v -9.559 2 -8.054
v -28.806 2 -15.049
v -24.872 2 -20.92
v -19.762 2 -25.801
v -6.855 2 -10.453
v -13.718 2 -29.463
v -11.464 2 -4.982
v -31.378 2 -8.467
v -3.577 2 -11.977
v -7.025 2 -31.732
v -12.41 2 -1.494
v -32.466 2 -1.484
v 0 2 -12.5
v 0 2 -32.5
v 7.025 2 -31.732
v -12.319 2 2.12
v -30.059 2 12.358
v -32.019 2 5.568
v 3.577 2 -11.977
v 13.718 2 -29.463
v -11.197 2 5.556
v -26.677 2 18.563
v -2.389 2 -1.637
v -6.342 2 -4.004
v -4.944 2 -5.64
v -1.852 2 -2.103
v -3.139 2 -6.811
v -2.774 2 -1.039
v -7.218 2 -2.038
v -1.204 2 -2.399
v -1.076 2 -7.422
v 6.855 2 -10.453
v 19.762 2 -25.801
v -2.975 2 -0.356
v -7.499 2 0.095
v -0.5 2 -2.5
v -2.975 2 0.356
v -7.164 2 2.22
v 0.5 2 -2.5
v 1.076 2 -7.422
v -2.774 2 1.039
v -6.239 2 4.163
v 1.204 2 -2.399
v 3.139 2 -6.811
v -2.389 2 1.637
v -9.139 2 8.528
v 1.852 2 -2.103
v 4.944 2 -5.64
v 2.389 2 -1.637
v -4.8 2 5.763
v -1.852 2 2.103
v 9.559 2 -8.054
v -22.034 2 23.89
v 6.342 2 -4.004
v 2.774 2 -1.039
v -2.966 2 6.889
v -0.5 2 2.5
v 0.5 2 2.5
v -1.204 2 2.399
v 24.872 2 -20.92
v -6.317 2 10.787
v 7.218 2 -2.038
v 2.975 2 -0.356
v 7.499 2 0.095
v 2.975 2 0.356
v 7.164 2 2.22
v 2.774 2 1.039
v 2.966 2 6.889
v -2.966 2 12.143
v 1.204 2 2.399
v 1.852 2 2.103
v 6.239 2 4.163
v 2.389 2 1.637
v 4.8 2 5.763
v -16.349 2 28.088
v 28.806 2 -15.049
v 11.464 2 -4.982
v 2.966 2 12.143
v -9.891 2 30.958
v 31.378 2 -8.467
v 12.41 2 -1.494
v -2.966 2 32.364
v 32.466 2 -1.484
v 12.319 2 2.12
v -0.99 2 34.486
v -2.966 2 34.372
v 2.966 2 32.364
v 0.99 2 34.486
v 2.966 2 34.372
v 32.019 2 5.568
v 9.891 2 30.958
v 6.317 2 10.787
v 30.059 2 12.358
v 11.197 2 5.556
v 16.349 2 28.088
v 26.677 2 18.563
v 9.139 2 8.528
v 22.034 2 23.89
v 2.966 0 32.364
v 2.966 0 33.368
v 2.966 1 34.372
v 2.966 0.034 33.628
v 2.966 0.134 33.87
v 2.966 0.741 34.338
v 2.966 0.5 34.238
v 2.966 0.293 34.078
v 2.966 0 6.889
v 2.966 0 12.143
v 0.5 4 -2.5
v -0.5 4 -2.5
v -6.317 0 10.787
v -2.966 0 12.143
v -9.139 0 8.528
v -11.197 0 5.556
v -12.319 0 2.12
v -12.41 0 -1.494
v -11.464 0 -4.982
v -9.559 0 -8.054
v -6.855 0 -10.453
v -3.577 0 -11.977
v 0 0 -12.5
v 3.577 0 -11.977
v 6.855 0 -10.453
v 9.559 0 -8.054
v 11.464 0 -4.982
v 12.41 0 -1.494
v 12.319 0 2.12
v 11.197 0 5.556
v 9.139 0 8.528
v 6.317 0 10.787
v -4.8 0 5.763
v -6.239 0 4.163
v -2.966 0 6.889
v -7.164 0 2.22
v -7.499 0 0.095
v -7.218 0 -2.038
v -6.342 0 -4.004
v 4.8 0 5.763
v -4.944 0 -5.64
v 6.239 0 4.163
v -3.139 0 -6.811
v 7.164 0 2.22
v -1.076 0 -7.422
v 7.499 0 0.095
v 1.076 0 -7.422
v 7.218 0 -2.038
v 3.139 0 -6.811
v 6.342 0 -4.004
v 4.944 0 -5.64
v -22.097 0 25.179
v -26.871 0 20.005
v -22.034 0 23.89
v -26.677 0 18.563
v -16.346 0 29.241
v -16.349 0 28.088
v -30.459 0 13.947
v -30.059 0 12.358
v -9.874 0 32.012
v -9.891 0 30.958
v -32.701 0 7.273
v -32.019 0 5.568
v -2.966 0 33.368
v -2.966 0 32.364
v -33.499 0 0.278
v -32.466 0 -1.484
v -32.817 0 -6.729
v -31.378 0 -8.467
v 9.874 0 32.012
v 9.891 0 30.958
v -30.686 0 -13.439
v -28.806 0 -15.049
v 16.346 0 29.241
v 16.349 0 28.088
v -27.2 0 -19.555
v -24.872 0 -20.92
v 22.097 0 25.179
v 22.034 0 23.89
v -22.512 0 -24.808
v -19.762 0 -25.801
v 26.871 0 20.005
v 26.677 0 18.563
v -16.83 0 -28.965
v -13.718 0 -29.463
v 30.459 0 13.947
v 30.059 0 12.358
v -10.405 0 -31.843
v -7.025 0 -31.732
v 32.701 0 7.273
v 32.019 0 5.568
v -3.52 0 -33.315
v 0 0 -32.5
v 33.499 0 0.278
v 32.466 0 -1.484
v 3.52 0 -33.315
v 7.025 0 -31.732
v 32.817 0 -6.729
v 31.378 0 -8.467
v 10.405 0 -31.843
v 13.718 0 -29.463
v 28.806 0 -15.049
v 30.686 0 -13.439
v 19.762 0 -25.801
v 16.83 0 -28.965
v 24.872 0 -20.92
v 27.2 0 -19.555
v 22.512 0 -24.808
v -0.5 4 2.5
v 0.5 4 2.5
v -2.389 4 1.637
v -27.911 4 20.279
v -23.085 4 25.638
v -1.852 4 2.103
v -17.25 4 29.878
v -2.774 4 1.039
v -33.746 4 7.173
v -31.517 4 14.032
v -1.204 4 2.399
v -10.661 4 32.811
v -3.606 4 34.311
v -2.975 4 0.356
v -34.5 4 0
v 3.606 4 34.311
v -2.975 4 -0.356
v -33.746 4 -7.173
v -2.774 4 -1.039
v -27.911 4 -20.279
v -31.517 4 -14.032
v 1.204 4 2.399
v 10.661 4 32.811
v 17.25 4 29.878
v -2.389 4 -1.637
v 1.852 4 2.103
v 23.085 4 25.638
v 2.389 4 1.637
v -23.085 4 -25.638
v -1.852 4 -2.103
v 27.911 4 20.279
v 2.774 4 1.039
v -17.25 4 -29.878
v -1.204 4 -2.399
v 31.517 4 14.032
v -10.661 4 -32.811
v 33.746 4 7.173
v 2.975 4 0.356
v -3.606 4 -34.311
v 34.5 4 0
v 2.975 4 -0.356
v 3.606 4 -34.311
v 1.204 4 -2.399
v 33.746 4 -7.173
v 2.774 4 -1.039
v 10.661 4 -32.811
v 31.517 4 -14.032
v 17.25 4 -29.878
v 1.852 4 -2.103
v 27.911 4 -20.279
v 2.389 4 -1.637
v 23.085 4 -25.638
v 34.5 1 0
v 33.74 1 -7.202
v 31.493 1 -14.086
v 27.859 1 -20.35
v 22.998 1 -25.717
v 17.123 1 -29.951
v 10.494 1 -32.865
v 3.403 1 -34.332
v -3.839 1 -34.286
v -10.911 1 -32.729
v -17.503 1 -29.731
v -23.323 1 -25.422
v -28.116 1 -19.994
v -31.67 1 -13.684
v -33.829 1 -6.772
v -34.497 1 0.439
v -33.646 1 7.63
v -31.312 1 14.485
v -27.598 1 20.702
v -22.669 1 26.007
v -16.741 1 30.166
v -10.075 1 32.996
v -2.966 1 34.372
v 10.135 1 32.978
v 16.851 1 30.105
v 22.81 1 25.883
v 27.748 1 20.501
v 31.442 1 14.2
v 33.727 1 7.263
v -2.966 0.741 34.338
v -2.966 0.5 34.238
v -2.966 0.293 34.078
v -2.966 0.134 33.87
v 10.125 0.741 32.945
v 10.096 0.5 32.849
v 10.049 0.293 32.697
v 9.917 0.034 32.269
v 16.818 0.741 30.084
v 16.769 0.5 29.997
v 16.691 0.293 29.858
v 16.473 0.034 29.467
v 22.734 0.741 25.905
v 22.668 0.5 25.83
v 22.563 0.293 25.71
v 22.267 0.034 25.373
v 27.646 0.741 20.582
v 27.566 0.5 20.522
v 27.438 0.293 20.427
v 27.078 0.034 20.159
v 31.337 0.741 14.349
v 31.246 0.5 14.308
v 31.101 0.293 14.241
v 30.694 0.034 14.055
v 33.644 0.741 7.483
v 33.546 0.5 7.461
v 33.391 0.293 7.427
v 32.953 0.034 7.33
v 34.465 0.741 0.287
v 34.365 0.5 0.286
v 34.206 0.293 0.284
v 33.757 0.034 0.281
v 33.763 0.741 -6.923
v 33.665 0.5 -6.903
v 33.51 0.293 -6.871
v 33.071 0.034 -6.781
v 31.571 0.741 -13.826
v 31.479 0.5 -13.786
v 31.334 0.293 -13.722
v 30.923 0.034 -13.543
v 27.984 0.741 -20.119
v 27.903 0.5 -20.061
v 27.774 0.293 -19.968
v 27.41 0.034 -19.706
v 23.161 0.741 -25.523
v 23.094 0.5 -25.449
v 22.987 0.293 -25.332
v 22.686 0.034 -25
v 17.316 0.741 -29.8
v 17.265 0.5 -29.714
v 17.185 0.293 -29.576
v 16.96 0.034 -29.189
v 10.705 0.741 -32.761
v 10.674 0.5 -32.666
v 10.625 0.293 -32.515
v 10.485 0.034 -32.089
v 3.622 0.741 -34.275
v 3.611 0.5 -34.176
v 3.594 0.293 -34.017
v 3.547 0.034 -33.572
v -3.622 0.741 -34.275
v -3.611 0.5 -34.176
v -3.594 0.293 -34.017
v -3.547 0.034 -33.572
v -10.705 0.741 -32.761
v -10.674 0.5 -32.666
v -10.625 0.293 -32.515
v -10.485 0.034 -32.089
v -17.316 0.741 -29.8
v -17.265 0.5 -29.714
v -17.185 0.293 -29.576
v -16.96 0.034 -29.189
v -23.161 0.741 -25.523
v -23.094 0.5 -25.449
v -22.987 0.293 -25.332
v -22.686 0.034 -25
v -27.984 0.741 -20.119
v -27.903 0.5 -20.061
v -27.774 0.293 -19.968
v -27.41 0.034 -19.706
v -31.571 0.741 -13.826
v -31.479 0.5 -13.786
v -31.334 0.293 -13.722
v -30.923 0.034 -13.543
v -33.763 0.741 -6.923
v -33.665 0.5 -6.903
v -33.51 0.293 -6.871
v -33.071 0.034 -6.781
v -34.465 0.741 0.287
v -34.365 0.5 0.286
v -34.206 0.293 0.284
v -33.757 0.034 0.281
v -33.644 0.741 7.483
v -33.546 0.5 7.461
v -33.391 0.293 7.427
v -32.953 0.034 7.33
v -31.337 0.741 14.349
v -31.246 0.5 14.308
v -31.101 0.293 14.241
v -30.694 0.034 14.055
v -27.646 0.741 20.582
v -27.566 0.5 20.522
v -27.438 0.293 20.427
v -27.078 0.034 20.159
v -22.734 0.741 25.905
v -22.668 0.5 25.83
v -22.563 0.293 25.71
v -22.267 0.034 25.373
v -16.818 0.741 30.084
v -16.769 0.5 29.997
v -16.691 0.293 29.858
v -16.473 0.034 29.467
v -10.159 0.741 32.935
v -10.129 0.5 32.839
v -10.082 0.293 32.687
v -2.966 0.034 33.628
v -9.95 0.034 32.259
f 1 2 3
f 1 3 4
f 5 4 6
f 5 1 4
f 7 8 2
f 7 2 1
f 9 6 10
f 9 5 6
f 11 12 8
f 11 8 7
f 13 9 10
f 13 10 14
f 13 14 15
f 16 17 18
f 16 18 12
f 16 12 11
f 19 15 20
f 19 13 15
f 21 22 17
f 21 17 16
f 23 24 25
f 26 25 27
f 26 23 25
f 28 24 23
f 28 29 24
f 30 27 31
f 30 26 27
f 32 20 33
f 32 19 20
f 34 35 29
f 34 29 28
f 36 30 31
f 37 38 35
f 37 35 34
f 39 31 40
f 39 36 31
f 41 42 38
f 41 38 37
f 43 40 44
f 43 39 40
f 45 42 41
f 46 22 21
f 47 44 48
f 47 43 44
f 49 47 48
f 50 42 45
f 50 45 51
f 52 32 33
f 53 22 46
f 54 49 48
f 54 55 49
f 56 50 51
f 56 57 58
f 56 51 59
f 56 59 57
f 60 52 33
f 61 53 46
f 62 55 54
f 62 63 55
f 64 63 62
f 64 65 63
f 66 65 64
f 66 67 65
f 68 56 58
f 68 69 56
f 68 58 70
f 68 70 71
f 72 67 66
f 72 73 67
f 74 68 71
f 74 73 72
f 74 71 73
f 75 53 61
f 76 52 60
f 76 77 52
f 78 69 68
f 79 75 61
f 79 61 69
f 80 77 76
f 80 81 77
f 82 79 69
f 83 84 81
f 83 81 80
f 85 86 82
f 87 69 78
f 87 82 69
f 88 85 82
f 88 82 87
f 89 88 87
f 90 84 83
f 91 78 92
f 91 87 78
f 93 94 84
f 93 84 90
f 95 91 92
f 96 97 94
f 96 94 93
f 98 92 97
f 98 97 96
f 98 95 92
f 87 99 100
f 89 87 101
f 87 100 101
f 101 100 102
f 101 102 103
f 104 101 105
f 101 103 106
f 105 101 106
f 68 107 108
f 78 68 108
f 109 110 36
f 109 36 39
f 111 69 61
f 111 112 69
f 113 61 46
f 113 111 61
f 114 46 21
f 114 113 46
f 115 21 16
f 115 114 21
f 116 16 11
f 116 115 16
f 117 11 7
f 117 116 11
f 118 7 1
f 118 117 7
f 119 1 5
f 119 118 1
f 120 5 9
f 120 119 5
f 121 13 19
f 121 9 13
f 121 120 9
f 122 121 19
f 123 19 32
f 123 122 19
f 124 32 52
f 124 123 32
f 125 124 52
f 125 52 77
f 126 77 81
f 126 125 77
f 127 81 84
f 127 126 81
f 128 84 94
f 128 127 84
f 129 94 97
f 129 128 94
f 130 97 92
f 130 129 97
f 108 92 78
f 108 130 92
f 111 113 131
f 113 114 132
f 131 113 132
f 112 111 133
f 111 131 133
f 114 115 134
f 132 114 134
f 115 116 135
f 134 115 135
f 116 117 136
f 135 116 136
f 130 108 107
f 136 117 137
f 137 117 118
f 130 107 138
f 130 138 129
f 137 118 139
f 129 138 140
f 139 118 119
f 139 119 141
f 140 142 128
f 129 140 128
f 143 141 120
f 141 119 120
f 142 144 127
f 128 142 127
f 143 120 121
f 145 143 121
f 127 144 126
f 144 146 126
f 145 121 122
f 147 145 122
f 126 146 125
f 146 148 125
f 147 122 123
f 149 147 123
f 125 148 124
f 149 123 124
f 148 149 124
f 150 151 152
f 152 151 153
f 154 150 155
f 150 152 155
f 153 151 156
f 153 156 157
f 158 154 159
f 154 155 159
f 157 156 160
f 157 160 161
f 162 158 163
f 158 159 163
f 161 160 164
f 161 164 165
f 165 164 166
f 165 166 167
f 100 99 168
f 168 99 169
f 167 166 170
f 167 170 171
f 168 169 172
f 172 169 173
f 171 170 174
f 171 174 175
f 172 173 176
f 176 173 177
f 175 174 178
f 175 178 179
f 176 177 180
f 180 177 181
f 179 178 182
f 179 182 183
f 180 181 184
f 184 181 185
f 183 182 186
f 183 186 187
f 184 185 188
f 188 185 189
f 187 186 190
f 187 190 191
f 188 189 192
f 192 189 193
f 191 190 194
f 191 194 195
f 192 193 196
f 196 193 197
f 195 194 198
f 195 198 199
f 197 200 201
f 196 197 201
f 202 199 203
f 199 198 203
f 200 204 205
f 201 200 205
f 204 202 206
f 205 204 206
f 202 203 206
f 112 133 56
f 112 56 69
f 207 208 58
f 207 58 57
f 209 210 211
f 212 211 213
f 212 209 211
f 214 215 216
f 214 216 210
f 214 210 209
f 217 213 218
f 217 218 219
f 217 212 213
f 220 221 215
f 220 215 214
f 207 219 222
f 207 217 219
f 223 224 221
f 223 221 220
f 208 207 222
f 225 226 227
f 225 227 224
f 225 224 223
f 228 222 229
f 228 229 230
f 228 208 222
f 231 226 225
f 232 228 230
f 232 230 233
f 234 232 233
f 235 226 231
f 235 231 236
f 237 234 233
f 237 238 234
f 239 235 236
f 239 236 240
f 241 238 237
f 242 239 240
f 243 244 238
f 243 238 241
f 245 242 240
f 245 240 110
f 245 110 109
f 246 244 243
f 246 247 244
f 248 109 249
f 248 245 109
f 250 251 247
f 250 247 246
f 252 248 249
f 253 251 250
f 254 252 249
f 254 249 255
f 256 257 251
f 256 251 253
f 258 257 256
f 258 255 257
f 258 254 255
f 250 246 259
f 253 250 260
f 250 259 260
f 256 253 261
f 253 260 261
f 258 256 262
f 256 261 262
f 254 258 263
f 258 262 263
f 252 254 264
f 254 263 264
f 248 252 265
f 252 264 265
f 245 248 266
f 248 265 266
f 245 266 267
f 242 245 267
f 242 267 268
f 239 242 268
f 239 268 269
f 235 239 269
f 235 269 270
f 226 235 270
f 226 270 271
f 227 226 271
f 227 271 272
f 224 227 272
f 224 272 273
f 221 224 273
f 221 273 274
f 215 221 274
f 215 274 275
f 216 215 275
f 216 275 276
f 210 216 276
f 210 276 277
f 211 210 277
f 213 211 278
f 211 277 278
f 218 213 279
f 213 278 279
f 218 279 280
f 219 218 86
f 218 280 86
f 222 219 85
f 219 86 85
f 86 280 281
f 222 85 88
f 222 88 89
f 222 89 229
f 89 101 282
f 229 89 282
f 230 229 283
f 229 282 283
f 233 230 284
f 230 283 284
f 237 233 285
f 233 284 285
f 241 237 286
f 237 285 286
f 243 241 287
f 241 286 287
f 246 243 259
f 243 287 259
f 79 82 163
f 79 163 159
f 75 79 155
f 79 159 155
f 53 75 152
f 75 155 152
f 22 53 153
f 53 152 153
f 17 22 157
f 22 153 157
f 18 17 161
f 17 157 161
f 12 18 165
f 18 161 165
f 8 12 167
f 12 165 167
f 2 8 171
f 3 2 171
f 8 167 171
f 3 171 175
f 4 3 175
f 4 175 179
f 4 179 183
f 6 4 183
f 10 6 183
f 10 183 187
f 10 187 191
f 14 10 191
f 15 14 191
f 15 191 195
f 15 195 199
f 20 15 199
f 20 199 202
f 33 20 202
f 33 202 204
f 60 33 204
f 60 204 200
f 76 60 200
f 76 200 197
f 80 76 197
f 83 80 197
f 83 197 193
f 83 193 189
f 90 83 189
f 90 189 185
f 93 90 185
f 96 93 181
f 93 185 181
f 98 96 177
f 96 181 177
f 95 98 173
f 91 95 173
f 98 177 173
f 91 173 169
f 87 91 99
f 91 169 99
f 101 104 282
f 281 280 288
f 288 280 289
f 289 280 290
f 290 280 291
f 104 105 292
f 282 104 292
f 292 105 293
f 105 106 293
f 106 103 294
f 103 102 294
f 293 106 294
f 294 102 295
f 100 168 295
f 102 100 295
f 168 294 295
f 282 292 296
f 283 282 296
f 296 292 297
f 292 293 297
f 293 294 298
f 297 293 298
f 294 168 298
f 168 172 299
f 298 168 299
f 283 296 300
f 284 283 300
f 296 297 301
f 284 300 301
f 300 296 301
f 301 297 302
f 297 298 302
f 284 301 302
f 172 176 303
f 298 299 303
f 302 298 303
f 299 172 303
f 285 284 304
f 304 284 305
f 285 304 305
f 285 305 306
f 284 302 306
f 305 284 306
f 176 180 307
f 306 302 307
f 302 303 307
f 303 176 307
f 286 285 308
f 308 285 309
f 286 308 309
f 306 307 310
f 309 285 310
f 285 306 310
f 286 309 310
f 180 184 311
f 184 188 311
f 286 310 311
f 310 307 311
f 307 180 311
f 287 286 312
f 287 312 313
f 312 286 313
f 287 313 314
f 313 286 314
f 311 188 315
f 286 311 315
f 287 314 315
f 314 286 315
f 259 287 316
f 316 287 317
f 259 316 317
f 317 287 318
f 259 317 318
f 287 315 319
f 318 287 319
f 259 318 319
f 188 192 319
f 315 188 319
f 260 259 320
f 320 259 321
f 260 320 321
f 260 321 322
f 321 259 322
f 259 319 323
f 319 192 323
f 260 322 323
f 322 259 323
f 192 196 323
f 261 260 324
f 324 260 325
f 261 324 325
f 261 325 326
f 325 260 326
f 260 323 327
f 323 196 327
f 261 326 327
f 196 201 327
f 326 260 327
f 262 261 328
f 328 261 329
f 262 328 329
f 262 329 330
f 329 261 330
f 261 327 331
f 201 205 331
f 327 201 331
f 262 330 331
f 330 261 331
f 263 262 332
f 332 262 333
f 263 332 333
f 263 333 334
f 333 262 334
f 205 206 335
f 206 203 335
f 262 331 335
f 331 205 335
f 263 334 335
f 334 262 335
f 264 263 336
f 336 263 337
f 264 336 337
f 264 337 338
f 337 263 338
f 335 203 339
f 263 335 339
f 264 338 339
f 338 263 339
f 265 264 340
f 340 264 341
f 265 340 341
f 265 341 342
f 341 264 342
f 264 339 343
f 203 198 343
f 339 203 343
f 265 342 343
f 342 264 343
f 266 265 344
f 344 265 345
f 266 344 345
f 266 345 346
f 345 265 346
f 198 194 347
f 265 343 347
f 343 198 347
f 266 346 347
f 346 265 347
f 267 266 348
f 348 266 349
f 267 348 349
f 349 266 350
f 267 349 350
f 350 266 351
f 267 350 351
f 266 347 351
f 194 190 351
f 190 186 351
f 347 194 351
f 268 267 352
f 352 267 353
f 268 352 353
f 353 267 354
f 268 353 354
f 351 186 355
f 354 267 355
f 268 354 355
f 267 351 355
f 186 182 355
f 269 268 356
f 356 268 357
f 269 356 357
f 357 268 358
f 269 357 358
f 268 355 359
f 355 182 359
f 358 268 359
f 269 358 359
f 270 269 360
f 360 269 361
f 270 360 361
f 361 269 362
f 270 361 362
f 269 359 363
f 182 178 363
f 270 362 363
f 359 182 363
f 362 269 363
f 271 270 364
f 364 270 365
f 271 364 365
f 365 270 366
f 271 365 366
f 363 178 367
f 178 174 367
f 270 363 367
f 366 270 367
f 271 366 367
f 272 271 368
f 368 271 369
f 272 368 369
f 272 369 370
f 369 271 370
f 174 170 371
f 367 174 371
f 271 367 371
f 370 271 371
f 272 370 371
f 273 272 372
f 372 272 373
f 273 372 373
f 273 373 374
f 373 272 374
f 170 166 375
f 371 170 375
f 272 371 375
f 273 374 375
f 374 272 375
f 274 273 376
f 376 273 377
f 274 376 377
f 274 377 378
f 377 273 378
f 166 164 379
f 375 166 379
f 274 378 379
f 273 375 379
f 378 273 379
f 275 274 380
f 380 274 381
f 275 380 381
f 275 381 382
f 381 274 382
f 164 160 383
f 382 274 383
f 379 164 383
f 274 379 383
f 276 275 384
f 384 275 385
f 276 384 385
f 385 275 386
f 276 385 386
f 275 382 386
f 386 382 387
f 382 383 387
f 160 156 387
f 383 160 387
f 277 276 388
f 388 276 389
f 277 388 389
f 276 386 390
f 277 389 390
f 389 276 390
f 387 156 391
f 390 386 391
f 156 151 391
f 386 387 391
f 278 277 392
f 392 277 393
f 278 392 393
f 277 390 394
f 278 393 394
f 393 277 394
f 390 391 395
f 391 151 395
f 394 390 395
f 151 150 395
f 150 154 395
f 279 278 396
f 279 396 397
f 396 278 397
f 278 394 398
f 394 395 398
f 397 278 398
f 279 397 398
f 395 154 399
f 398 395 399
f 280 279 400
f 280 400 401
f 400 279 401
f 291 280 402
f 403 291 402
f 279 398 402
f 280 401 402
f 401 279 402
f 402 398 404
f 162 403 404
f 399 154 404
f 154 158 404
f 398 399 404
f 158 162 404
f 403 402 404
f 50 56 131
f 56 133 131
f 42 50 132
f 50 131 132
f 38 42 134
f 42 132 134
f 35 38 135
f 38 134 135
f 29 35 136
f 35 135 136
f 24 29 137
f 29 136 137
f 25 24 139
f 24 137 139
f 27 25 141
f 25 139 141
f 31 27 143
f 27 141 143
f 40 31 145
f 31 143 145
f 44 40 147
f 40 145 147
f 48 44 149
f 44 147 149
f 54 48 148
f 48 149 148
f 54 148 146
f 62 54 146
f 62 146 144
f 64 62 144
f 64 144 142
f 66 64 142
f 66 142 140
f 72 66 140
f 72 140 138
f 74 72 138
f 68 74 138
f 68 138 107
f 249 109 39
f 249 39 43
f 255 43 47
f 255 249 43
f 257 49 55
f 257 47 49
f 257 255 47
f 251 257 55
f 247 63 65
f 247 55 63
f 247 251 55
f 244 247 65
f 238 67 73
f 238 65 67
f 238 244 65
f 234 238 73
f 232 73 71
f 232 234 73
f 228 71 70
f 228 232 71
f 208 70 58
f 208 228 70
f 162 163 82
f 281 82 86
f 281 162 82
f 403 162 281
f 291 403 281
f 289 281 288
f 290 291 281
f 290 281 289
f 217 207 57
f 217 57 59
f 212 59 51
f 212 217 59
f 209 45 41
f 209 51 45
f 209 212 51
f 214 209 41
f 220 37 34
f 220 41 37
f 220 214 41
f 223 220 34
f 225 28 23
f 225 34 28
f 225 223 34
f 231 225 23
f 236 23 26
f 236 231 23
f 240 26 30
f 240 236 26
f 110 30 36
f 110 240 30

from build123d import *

# Parameters (mm, degrees)
SKETCH1_R           = 34.5
BOSS_EXTRUDE1_DEPTH = 4
CUT_EXTRUDE1_DEPTH  = 4
SKETCH3_R           = 32.5
SKETCH3_R_2         = 12.5
SKETCH3_R_3         = 7.5
CUT_EXTRUDE2_DEPTH  = 2
SKETCH4_W           = 5.931596908
SKETCH4_H           = 30.157362647
CUT_EXTRUDE3_DEPTH  = 2
FILLET1_R           = 1


with BuildPart() as part:
    # Sketch1 → Boss-Extrude1 (new body)
    with BuildSketch(Plane(origin=(0, 0, 0), x_dir=(1, 0, 0), z_dir=(0, 1, 0))):
        Circle(SKETCH1_R)
    extrude(amount=BOSS_EXTRUDE1_DEPTH)

    # Sketch2 → Cut-Extrude1 (cut)
    with BuildSketch(Plane(origin=(0, 4, 0), x_dir=(1, 0, 0), z_dir=(0, 1, 0))):
        with BuildLine():
            Line((0.5, -2.5), (-0.5, -2.5))
            ThreePointArc((-0.5, -2.5), (-3, 0), (-0.5, 2.5))
            Line((-0.5, 2.5), (0.5, 2.5))
            ThreePointArc((0.5, 2.5), (3, 0), (0.5, -2.5))
        make_face()
    extrude(amount=-CUT_EXTRUDE1_DEPTH, mode=Mode.SUBTRACT)

    # Sketch3 → Cut-Extrude2 (cut)
    with BuildSketch(Plane.XZ):
        Circle(SKETCH3_R)
        Circle(SKETCH3_R_2, mode=Mode.SUBTRACT)
        Circle(SKETCH3_R_3)
        with BuildLine():
            ThreePointArc((-0.5, -2.5), (-3, 0), (-0.5, 2.5))
            Line((-0.5, 2.5), (0.5, 2.5))
            ThreePointArc((0.5, 2.5), (3, 0), (0.5, -2.5))
            Line((0.5, -2.5), (-0.5, -2.5))
        make_face(mode=Mode.SUBTRACT)
    extrude(amount=-CUT_EXTRUDE2_DEPTH, mode=Mode.SUBTRACT)

    # Sketch4 → Cut-Extrude3 (cut)
    with BuildSketch(Plane.XZ):
        with Locations((0, 21.96737057)):
            Rectangle(SKETCH4_W, SKETCH4_H)
    extrude(amount=-CUT_EXTRUDE3_DEPTH, mode=Mode.SUBTRACT)

    # Fillet1
    fillet1_edges = [part.edges().sort_by_distance(p)[0] for p in [
        (-23.323056761, 0, -25.422136482),
    ]]
    fillet(fillet1_edges, radius=FILLET1_R)


solid = part.part
